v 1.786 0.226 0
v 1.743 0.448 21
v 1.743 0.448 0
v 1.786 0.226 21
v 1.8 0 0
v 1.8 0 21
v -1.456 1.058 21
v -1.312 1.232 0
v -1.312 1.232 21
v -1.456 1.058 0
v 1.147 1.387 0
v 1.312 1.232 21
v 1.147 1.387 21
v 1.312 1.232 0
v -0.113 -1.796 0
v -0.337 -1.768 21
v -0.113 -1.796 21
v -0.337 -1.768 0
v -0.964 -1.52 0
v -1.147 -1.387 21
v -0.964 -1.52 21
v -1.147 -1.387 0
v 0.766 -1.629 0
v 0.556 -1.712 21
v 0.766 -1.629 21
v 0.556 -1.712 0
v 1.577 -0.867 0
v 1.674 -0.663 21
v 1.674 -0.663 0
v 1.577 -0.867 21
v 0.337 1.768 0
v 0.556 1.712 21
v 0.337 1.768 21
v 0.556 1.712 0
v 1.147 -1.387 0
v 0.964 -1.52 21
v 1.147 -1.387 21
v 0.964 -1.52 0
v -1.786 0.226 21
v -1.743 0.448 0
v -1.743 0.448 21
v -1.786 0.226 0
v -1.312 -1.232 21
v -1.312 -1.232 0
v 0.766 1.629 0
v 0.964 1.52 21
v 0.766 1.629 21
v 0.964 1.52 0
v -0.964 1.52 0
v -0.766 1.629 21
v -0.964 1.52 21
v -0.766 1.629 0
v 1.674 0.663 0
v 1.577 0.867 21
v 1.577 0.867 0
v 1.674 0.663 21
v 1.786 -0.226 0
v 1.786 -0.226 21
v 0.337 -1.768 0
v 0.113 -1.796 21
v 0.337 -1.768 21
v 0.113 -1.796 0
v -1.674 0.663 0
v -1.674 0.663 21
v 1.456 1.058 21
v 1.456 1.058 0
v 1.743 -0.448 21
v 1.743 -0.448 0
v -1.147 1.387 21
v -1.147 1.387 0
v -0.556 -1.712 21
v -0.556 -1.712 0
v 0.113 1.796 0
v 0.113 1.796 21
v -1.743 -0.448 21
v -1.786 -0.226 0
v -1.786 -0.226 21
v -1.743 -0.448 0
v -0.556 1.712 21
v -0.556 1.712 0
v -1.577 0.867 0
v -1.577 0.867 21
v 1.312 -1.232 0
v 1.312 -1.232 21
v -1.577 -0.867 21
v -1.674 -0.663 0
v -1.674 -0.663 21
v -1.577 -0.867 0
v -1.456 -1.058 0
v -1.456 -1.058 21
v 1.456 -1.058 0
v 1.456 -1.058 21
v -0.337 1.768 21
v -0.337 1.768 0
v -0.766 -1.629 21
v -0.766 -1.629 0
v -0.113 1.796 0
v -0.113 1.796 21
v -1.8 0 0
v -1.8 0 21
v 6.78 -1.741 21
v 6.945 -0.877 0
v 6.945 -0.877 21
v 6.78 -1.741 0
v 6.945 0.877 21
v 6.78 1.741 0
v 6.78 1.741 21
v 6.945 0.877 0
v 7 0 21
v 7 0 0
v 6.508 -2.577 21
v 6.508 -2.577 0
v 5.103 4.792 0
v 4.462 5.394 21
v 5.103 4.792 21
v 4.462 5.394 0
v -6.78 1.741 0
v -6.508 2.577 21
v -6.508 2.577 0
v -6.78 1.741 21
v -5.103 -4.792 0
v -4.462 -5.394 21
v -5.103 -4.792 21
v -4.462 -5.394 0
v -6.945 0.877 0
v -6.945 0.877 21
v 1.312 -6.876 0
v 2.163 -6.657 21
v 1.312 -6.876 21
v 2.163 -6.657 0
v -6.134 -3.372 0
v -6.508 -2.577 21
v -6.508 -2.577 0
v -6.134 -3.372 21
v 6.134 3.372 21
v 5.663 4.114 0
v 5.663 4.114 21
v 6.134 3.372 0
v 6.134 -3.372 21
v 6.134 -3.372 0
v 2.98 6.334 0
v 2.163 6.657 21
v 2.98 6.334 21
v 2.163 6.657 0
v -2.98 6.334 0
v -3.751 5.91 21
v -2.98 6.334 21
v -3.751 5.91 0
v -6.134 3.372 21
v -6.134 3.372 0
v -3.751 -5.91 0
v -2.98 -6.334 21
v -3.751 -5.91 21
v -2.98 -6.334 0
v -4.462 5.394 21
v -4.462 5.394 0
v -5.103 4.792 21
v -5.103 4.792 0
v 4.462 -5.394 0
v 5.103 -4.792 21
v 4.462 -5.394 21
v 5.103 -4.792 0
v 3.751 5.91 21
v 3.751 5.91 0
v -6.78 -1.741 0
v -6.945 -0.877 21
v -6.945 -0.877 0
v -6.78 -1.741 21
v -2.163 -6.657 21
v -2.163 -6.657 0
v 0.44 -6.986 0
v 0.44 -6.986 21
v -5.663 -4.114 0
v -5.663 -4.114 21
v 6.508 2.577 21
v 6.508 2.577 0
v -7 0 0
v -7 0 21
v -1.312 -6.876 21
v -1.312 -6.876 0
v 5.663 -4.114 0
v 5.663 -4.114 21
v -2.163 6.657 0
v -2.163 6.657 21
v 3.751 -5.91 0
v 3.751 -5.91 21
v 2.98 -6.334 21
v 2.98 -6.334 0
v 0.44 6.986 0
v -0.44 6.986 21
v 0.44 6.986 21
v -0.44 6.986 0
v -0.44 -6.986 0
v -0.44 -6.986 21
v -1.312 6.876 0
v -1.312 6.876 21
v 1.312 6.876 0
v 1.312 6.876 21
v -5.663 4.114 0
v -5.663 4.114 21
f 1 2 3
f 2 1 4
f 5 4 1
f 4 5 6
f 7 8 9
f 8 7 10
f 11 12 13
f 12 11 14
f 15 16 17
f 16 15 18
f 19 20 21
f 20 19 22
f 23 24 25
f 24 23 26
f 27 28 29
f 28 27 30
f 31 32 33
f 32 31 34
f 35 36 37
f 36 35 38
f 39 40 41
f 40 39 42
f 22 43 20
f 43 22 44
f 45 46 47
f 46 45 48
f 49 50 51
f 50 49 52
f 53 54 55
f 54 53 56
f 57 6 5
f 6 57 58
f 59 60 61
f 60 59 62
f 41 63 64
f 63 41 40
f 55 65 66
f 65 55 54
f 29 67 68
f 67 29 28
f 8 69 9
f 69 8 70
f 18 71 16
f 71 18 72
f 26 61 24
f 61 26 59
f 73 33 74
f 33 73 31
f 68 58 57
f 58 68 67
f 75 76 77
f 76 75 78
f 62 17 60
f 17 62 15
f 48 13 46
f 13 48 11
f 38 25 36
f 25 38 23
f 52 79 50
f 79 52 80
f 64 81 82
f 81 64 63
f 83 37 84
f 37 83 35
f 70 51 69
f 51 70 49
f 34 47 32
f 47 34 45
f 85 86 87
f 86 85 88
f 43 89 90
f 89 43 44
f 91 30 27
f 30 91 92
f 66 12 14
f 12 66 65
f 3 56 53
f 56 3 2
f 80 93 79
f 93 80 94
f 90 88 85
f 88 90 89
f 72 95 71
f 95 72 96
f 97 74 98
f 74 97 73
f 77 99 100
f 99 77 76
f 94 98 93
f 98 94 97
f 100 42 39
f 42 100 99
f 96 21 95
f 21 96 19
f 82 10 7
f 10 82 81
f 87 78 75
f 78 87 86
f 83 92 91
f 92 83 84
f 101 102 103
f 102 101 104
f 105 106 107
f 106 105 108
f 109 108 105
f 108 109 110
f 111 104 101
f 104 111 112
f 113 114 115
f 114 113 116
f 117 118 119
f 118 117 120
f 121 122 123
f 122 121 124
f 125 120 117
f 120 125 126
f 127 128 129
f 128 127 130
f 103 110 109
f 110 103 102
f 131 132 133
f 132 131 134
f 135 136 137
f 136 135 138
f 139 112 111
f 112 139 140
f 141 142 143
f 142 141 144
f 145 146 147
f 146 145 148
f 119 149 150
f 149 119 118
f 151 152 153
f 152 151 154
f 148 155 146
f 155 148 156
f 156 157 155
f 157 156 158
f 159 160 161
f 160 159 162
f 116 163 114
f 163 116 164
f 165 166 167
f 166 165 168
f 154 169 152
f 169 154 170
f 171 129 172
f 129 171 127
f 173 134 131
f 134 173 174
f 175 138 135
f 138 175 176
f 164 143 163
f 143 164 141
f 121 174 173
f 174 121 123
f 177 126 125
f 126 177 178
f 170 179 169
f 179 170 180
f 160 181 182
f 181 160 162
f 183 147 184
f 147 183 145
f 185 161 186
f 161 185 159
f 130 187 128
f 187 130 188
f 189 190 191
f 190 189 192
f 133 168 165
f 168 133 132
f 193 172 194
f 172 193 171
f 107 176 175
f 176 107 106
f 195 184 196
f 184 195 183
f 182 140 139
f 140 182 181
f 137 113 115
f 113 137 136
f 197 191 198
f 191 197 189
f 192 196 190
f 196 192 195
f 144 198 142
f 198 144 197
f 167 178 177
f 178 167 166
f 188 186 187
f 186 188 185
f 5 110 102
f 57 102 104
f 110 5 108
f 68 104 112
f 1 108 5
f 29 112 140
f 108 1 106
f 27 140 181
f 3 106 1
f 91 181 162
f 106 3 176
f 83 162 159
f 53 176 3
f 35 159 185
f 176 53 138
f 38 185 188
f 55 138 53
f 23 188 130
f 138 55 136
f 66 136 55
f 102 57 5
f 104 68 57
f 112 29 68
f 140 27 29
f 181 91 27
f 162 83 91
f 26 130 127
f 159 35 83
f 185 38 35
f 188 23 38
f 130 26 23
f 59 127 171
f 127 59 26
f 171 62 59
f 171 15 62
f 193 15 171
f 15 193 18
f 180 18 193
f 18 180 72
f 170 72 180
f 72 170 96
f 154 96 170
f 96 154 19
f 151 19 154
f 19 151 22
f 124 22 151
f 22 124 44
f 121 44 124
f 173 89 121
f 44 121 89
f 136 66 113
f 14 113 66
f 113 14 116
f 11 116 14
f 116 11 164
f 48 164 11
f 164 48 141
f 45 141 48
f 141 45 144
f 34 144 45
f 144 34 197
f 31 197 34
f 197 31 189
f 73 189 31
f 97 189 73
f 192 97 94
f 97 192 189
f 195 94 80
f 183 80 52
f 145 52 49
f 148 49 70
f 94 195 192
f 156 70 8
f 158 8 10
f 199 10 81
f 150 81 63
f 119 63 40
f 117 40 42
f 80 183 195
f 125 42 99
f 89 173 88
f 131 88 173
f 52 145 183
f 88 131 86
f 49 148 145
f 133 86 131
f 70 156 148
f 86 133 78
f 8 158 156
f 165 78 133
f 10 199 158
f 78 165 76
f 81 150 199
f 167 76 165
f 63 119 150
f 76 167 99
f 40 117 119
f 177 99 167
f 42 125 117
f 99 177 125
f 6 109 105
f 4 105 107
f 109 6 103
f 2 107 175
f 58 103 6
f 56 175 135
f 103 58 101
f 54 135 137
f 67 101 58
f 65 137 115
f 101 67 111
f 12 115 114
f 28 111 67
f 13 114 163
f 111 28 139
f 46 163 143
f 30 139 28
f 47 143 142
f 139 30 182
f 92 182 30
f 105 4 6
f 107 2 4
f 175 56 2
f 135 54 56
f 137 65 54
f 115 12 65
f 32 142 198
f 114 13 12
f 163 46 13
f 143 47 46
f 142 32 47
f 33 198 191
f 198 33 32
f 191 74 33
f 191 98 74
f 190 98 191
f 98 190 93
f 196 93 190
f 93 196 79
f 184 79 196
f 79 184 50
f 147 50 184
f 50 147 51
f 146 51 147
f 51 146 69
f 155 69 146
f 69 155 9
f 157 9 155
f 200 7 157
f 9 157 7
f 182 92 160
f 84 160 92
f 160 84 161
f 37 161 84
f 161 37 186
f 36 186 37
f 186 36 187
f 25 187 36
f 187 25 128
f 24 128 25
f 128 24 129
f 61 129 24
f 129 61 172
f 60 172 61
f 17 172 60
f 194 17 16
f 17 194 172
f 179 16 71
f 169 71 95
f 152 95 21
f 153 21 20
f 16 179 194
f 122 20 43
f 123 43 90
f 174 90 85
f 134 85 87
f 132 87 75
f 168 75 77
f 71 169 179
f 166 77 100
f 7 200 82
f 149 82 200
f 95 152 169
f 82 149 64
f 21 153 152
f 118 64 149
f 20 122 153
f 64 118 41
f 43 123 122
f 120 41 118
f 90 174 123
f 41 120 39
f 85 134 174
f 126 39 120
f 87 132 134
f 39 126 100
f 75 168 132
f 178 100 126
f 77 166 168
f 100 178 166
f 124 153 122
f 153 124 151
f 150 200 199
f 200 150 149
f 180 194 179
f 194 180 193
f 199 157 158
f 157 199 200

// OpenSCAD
$fn = 50;


difference() {
	union() {
		cylinder(h = 21, r = 7.0000000000);
	}
	union() {
		translate(v = [0, 0, -100]) {
			cylinder(h = 200, r = 1.8000000000);
		}
		translate(v = [0, 0, -100]) {
			cylinder(h = 200, r = 1.8000000000);
		}
	}
}
